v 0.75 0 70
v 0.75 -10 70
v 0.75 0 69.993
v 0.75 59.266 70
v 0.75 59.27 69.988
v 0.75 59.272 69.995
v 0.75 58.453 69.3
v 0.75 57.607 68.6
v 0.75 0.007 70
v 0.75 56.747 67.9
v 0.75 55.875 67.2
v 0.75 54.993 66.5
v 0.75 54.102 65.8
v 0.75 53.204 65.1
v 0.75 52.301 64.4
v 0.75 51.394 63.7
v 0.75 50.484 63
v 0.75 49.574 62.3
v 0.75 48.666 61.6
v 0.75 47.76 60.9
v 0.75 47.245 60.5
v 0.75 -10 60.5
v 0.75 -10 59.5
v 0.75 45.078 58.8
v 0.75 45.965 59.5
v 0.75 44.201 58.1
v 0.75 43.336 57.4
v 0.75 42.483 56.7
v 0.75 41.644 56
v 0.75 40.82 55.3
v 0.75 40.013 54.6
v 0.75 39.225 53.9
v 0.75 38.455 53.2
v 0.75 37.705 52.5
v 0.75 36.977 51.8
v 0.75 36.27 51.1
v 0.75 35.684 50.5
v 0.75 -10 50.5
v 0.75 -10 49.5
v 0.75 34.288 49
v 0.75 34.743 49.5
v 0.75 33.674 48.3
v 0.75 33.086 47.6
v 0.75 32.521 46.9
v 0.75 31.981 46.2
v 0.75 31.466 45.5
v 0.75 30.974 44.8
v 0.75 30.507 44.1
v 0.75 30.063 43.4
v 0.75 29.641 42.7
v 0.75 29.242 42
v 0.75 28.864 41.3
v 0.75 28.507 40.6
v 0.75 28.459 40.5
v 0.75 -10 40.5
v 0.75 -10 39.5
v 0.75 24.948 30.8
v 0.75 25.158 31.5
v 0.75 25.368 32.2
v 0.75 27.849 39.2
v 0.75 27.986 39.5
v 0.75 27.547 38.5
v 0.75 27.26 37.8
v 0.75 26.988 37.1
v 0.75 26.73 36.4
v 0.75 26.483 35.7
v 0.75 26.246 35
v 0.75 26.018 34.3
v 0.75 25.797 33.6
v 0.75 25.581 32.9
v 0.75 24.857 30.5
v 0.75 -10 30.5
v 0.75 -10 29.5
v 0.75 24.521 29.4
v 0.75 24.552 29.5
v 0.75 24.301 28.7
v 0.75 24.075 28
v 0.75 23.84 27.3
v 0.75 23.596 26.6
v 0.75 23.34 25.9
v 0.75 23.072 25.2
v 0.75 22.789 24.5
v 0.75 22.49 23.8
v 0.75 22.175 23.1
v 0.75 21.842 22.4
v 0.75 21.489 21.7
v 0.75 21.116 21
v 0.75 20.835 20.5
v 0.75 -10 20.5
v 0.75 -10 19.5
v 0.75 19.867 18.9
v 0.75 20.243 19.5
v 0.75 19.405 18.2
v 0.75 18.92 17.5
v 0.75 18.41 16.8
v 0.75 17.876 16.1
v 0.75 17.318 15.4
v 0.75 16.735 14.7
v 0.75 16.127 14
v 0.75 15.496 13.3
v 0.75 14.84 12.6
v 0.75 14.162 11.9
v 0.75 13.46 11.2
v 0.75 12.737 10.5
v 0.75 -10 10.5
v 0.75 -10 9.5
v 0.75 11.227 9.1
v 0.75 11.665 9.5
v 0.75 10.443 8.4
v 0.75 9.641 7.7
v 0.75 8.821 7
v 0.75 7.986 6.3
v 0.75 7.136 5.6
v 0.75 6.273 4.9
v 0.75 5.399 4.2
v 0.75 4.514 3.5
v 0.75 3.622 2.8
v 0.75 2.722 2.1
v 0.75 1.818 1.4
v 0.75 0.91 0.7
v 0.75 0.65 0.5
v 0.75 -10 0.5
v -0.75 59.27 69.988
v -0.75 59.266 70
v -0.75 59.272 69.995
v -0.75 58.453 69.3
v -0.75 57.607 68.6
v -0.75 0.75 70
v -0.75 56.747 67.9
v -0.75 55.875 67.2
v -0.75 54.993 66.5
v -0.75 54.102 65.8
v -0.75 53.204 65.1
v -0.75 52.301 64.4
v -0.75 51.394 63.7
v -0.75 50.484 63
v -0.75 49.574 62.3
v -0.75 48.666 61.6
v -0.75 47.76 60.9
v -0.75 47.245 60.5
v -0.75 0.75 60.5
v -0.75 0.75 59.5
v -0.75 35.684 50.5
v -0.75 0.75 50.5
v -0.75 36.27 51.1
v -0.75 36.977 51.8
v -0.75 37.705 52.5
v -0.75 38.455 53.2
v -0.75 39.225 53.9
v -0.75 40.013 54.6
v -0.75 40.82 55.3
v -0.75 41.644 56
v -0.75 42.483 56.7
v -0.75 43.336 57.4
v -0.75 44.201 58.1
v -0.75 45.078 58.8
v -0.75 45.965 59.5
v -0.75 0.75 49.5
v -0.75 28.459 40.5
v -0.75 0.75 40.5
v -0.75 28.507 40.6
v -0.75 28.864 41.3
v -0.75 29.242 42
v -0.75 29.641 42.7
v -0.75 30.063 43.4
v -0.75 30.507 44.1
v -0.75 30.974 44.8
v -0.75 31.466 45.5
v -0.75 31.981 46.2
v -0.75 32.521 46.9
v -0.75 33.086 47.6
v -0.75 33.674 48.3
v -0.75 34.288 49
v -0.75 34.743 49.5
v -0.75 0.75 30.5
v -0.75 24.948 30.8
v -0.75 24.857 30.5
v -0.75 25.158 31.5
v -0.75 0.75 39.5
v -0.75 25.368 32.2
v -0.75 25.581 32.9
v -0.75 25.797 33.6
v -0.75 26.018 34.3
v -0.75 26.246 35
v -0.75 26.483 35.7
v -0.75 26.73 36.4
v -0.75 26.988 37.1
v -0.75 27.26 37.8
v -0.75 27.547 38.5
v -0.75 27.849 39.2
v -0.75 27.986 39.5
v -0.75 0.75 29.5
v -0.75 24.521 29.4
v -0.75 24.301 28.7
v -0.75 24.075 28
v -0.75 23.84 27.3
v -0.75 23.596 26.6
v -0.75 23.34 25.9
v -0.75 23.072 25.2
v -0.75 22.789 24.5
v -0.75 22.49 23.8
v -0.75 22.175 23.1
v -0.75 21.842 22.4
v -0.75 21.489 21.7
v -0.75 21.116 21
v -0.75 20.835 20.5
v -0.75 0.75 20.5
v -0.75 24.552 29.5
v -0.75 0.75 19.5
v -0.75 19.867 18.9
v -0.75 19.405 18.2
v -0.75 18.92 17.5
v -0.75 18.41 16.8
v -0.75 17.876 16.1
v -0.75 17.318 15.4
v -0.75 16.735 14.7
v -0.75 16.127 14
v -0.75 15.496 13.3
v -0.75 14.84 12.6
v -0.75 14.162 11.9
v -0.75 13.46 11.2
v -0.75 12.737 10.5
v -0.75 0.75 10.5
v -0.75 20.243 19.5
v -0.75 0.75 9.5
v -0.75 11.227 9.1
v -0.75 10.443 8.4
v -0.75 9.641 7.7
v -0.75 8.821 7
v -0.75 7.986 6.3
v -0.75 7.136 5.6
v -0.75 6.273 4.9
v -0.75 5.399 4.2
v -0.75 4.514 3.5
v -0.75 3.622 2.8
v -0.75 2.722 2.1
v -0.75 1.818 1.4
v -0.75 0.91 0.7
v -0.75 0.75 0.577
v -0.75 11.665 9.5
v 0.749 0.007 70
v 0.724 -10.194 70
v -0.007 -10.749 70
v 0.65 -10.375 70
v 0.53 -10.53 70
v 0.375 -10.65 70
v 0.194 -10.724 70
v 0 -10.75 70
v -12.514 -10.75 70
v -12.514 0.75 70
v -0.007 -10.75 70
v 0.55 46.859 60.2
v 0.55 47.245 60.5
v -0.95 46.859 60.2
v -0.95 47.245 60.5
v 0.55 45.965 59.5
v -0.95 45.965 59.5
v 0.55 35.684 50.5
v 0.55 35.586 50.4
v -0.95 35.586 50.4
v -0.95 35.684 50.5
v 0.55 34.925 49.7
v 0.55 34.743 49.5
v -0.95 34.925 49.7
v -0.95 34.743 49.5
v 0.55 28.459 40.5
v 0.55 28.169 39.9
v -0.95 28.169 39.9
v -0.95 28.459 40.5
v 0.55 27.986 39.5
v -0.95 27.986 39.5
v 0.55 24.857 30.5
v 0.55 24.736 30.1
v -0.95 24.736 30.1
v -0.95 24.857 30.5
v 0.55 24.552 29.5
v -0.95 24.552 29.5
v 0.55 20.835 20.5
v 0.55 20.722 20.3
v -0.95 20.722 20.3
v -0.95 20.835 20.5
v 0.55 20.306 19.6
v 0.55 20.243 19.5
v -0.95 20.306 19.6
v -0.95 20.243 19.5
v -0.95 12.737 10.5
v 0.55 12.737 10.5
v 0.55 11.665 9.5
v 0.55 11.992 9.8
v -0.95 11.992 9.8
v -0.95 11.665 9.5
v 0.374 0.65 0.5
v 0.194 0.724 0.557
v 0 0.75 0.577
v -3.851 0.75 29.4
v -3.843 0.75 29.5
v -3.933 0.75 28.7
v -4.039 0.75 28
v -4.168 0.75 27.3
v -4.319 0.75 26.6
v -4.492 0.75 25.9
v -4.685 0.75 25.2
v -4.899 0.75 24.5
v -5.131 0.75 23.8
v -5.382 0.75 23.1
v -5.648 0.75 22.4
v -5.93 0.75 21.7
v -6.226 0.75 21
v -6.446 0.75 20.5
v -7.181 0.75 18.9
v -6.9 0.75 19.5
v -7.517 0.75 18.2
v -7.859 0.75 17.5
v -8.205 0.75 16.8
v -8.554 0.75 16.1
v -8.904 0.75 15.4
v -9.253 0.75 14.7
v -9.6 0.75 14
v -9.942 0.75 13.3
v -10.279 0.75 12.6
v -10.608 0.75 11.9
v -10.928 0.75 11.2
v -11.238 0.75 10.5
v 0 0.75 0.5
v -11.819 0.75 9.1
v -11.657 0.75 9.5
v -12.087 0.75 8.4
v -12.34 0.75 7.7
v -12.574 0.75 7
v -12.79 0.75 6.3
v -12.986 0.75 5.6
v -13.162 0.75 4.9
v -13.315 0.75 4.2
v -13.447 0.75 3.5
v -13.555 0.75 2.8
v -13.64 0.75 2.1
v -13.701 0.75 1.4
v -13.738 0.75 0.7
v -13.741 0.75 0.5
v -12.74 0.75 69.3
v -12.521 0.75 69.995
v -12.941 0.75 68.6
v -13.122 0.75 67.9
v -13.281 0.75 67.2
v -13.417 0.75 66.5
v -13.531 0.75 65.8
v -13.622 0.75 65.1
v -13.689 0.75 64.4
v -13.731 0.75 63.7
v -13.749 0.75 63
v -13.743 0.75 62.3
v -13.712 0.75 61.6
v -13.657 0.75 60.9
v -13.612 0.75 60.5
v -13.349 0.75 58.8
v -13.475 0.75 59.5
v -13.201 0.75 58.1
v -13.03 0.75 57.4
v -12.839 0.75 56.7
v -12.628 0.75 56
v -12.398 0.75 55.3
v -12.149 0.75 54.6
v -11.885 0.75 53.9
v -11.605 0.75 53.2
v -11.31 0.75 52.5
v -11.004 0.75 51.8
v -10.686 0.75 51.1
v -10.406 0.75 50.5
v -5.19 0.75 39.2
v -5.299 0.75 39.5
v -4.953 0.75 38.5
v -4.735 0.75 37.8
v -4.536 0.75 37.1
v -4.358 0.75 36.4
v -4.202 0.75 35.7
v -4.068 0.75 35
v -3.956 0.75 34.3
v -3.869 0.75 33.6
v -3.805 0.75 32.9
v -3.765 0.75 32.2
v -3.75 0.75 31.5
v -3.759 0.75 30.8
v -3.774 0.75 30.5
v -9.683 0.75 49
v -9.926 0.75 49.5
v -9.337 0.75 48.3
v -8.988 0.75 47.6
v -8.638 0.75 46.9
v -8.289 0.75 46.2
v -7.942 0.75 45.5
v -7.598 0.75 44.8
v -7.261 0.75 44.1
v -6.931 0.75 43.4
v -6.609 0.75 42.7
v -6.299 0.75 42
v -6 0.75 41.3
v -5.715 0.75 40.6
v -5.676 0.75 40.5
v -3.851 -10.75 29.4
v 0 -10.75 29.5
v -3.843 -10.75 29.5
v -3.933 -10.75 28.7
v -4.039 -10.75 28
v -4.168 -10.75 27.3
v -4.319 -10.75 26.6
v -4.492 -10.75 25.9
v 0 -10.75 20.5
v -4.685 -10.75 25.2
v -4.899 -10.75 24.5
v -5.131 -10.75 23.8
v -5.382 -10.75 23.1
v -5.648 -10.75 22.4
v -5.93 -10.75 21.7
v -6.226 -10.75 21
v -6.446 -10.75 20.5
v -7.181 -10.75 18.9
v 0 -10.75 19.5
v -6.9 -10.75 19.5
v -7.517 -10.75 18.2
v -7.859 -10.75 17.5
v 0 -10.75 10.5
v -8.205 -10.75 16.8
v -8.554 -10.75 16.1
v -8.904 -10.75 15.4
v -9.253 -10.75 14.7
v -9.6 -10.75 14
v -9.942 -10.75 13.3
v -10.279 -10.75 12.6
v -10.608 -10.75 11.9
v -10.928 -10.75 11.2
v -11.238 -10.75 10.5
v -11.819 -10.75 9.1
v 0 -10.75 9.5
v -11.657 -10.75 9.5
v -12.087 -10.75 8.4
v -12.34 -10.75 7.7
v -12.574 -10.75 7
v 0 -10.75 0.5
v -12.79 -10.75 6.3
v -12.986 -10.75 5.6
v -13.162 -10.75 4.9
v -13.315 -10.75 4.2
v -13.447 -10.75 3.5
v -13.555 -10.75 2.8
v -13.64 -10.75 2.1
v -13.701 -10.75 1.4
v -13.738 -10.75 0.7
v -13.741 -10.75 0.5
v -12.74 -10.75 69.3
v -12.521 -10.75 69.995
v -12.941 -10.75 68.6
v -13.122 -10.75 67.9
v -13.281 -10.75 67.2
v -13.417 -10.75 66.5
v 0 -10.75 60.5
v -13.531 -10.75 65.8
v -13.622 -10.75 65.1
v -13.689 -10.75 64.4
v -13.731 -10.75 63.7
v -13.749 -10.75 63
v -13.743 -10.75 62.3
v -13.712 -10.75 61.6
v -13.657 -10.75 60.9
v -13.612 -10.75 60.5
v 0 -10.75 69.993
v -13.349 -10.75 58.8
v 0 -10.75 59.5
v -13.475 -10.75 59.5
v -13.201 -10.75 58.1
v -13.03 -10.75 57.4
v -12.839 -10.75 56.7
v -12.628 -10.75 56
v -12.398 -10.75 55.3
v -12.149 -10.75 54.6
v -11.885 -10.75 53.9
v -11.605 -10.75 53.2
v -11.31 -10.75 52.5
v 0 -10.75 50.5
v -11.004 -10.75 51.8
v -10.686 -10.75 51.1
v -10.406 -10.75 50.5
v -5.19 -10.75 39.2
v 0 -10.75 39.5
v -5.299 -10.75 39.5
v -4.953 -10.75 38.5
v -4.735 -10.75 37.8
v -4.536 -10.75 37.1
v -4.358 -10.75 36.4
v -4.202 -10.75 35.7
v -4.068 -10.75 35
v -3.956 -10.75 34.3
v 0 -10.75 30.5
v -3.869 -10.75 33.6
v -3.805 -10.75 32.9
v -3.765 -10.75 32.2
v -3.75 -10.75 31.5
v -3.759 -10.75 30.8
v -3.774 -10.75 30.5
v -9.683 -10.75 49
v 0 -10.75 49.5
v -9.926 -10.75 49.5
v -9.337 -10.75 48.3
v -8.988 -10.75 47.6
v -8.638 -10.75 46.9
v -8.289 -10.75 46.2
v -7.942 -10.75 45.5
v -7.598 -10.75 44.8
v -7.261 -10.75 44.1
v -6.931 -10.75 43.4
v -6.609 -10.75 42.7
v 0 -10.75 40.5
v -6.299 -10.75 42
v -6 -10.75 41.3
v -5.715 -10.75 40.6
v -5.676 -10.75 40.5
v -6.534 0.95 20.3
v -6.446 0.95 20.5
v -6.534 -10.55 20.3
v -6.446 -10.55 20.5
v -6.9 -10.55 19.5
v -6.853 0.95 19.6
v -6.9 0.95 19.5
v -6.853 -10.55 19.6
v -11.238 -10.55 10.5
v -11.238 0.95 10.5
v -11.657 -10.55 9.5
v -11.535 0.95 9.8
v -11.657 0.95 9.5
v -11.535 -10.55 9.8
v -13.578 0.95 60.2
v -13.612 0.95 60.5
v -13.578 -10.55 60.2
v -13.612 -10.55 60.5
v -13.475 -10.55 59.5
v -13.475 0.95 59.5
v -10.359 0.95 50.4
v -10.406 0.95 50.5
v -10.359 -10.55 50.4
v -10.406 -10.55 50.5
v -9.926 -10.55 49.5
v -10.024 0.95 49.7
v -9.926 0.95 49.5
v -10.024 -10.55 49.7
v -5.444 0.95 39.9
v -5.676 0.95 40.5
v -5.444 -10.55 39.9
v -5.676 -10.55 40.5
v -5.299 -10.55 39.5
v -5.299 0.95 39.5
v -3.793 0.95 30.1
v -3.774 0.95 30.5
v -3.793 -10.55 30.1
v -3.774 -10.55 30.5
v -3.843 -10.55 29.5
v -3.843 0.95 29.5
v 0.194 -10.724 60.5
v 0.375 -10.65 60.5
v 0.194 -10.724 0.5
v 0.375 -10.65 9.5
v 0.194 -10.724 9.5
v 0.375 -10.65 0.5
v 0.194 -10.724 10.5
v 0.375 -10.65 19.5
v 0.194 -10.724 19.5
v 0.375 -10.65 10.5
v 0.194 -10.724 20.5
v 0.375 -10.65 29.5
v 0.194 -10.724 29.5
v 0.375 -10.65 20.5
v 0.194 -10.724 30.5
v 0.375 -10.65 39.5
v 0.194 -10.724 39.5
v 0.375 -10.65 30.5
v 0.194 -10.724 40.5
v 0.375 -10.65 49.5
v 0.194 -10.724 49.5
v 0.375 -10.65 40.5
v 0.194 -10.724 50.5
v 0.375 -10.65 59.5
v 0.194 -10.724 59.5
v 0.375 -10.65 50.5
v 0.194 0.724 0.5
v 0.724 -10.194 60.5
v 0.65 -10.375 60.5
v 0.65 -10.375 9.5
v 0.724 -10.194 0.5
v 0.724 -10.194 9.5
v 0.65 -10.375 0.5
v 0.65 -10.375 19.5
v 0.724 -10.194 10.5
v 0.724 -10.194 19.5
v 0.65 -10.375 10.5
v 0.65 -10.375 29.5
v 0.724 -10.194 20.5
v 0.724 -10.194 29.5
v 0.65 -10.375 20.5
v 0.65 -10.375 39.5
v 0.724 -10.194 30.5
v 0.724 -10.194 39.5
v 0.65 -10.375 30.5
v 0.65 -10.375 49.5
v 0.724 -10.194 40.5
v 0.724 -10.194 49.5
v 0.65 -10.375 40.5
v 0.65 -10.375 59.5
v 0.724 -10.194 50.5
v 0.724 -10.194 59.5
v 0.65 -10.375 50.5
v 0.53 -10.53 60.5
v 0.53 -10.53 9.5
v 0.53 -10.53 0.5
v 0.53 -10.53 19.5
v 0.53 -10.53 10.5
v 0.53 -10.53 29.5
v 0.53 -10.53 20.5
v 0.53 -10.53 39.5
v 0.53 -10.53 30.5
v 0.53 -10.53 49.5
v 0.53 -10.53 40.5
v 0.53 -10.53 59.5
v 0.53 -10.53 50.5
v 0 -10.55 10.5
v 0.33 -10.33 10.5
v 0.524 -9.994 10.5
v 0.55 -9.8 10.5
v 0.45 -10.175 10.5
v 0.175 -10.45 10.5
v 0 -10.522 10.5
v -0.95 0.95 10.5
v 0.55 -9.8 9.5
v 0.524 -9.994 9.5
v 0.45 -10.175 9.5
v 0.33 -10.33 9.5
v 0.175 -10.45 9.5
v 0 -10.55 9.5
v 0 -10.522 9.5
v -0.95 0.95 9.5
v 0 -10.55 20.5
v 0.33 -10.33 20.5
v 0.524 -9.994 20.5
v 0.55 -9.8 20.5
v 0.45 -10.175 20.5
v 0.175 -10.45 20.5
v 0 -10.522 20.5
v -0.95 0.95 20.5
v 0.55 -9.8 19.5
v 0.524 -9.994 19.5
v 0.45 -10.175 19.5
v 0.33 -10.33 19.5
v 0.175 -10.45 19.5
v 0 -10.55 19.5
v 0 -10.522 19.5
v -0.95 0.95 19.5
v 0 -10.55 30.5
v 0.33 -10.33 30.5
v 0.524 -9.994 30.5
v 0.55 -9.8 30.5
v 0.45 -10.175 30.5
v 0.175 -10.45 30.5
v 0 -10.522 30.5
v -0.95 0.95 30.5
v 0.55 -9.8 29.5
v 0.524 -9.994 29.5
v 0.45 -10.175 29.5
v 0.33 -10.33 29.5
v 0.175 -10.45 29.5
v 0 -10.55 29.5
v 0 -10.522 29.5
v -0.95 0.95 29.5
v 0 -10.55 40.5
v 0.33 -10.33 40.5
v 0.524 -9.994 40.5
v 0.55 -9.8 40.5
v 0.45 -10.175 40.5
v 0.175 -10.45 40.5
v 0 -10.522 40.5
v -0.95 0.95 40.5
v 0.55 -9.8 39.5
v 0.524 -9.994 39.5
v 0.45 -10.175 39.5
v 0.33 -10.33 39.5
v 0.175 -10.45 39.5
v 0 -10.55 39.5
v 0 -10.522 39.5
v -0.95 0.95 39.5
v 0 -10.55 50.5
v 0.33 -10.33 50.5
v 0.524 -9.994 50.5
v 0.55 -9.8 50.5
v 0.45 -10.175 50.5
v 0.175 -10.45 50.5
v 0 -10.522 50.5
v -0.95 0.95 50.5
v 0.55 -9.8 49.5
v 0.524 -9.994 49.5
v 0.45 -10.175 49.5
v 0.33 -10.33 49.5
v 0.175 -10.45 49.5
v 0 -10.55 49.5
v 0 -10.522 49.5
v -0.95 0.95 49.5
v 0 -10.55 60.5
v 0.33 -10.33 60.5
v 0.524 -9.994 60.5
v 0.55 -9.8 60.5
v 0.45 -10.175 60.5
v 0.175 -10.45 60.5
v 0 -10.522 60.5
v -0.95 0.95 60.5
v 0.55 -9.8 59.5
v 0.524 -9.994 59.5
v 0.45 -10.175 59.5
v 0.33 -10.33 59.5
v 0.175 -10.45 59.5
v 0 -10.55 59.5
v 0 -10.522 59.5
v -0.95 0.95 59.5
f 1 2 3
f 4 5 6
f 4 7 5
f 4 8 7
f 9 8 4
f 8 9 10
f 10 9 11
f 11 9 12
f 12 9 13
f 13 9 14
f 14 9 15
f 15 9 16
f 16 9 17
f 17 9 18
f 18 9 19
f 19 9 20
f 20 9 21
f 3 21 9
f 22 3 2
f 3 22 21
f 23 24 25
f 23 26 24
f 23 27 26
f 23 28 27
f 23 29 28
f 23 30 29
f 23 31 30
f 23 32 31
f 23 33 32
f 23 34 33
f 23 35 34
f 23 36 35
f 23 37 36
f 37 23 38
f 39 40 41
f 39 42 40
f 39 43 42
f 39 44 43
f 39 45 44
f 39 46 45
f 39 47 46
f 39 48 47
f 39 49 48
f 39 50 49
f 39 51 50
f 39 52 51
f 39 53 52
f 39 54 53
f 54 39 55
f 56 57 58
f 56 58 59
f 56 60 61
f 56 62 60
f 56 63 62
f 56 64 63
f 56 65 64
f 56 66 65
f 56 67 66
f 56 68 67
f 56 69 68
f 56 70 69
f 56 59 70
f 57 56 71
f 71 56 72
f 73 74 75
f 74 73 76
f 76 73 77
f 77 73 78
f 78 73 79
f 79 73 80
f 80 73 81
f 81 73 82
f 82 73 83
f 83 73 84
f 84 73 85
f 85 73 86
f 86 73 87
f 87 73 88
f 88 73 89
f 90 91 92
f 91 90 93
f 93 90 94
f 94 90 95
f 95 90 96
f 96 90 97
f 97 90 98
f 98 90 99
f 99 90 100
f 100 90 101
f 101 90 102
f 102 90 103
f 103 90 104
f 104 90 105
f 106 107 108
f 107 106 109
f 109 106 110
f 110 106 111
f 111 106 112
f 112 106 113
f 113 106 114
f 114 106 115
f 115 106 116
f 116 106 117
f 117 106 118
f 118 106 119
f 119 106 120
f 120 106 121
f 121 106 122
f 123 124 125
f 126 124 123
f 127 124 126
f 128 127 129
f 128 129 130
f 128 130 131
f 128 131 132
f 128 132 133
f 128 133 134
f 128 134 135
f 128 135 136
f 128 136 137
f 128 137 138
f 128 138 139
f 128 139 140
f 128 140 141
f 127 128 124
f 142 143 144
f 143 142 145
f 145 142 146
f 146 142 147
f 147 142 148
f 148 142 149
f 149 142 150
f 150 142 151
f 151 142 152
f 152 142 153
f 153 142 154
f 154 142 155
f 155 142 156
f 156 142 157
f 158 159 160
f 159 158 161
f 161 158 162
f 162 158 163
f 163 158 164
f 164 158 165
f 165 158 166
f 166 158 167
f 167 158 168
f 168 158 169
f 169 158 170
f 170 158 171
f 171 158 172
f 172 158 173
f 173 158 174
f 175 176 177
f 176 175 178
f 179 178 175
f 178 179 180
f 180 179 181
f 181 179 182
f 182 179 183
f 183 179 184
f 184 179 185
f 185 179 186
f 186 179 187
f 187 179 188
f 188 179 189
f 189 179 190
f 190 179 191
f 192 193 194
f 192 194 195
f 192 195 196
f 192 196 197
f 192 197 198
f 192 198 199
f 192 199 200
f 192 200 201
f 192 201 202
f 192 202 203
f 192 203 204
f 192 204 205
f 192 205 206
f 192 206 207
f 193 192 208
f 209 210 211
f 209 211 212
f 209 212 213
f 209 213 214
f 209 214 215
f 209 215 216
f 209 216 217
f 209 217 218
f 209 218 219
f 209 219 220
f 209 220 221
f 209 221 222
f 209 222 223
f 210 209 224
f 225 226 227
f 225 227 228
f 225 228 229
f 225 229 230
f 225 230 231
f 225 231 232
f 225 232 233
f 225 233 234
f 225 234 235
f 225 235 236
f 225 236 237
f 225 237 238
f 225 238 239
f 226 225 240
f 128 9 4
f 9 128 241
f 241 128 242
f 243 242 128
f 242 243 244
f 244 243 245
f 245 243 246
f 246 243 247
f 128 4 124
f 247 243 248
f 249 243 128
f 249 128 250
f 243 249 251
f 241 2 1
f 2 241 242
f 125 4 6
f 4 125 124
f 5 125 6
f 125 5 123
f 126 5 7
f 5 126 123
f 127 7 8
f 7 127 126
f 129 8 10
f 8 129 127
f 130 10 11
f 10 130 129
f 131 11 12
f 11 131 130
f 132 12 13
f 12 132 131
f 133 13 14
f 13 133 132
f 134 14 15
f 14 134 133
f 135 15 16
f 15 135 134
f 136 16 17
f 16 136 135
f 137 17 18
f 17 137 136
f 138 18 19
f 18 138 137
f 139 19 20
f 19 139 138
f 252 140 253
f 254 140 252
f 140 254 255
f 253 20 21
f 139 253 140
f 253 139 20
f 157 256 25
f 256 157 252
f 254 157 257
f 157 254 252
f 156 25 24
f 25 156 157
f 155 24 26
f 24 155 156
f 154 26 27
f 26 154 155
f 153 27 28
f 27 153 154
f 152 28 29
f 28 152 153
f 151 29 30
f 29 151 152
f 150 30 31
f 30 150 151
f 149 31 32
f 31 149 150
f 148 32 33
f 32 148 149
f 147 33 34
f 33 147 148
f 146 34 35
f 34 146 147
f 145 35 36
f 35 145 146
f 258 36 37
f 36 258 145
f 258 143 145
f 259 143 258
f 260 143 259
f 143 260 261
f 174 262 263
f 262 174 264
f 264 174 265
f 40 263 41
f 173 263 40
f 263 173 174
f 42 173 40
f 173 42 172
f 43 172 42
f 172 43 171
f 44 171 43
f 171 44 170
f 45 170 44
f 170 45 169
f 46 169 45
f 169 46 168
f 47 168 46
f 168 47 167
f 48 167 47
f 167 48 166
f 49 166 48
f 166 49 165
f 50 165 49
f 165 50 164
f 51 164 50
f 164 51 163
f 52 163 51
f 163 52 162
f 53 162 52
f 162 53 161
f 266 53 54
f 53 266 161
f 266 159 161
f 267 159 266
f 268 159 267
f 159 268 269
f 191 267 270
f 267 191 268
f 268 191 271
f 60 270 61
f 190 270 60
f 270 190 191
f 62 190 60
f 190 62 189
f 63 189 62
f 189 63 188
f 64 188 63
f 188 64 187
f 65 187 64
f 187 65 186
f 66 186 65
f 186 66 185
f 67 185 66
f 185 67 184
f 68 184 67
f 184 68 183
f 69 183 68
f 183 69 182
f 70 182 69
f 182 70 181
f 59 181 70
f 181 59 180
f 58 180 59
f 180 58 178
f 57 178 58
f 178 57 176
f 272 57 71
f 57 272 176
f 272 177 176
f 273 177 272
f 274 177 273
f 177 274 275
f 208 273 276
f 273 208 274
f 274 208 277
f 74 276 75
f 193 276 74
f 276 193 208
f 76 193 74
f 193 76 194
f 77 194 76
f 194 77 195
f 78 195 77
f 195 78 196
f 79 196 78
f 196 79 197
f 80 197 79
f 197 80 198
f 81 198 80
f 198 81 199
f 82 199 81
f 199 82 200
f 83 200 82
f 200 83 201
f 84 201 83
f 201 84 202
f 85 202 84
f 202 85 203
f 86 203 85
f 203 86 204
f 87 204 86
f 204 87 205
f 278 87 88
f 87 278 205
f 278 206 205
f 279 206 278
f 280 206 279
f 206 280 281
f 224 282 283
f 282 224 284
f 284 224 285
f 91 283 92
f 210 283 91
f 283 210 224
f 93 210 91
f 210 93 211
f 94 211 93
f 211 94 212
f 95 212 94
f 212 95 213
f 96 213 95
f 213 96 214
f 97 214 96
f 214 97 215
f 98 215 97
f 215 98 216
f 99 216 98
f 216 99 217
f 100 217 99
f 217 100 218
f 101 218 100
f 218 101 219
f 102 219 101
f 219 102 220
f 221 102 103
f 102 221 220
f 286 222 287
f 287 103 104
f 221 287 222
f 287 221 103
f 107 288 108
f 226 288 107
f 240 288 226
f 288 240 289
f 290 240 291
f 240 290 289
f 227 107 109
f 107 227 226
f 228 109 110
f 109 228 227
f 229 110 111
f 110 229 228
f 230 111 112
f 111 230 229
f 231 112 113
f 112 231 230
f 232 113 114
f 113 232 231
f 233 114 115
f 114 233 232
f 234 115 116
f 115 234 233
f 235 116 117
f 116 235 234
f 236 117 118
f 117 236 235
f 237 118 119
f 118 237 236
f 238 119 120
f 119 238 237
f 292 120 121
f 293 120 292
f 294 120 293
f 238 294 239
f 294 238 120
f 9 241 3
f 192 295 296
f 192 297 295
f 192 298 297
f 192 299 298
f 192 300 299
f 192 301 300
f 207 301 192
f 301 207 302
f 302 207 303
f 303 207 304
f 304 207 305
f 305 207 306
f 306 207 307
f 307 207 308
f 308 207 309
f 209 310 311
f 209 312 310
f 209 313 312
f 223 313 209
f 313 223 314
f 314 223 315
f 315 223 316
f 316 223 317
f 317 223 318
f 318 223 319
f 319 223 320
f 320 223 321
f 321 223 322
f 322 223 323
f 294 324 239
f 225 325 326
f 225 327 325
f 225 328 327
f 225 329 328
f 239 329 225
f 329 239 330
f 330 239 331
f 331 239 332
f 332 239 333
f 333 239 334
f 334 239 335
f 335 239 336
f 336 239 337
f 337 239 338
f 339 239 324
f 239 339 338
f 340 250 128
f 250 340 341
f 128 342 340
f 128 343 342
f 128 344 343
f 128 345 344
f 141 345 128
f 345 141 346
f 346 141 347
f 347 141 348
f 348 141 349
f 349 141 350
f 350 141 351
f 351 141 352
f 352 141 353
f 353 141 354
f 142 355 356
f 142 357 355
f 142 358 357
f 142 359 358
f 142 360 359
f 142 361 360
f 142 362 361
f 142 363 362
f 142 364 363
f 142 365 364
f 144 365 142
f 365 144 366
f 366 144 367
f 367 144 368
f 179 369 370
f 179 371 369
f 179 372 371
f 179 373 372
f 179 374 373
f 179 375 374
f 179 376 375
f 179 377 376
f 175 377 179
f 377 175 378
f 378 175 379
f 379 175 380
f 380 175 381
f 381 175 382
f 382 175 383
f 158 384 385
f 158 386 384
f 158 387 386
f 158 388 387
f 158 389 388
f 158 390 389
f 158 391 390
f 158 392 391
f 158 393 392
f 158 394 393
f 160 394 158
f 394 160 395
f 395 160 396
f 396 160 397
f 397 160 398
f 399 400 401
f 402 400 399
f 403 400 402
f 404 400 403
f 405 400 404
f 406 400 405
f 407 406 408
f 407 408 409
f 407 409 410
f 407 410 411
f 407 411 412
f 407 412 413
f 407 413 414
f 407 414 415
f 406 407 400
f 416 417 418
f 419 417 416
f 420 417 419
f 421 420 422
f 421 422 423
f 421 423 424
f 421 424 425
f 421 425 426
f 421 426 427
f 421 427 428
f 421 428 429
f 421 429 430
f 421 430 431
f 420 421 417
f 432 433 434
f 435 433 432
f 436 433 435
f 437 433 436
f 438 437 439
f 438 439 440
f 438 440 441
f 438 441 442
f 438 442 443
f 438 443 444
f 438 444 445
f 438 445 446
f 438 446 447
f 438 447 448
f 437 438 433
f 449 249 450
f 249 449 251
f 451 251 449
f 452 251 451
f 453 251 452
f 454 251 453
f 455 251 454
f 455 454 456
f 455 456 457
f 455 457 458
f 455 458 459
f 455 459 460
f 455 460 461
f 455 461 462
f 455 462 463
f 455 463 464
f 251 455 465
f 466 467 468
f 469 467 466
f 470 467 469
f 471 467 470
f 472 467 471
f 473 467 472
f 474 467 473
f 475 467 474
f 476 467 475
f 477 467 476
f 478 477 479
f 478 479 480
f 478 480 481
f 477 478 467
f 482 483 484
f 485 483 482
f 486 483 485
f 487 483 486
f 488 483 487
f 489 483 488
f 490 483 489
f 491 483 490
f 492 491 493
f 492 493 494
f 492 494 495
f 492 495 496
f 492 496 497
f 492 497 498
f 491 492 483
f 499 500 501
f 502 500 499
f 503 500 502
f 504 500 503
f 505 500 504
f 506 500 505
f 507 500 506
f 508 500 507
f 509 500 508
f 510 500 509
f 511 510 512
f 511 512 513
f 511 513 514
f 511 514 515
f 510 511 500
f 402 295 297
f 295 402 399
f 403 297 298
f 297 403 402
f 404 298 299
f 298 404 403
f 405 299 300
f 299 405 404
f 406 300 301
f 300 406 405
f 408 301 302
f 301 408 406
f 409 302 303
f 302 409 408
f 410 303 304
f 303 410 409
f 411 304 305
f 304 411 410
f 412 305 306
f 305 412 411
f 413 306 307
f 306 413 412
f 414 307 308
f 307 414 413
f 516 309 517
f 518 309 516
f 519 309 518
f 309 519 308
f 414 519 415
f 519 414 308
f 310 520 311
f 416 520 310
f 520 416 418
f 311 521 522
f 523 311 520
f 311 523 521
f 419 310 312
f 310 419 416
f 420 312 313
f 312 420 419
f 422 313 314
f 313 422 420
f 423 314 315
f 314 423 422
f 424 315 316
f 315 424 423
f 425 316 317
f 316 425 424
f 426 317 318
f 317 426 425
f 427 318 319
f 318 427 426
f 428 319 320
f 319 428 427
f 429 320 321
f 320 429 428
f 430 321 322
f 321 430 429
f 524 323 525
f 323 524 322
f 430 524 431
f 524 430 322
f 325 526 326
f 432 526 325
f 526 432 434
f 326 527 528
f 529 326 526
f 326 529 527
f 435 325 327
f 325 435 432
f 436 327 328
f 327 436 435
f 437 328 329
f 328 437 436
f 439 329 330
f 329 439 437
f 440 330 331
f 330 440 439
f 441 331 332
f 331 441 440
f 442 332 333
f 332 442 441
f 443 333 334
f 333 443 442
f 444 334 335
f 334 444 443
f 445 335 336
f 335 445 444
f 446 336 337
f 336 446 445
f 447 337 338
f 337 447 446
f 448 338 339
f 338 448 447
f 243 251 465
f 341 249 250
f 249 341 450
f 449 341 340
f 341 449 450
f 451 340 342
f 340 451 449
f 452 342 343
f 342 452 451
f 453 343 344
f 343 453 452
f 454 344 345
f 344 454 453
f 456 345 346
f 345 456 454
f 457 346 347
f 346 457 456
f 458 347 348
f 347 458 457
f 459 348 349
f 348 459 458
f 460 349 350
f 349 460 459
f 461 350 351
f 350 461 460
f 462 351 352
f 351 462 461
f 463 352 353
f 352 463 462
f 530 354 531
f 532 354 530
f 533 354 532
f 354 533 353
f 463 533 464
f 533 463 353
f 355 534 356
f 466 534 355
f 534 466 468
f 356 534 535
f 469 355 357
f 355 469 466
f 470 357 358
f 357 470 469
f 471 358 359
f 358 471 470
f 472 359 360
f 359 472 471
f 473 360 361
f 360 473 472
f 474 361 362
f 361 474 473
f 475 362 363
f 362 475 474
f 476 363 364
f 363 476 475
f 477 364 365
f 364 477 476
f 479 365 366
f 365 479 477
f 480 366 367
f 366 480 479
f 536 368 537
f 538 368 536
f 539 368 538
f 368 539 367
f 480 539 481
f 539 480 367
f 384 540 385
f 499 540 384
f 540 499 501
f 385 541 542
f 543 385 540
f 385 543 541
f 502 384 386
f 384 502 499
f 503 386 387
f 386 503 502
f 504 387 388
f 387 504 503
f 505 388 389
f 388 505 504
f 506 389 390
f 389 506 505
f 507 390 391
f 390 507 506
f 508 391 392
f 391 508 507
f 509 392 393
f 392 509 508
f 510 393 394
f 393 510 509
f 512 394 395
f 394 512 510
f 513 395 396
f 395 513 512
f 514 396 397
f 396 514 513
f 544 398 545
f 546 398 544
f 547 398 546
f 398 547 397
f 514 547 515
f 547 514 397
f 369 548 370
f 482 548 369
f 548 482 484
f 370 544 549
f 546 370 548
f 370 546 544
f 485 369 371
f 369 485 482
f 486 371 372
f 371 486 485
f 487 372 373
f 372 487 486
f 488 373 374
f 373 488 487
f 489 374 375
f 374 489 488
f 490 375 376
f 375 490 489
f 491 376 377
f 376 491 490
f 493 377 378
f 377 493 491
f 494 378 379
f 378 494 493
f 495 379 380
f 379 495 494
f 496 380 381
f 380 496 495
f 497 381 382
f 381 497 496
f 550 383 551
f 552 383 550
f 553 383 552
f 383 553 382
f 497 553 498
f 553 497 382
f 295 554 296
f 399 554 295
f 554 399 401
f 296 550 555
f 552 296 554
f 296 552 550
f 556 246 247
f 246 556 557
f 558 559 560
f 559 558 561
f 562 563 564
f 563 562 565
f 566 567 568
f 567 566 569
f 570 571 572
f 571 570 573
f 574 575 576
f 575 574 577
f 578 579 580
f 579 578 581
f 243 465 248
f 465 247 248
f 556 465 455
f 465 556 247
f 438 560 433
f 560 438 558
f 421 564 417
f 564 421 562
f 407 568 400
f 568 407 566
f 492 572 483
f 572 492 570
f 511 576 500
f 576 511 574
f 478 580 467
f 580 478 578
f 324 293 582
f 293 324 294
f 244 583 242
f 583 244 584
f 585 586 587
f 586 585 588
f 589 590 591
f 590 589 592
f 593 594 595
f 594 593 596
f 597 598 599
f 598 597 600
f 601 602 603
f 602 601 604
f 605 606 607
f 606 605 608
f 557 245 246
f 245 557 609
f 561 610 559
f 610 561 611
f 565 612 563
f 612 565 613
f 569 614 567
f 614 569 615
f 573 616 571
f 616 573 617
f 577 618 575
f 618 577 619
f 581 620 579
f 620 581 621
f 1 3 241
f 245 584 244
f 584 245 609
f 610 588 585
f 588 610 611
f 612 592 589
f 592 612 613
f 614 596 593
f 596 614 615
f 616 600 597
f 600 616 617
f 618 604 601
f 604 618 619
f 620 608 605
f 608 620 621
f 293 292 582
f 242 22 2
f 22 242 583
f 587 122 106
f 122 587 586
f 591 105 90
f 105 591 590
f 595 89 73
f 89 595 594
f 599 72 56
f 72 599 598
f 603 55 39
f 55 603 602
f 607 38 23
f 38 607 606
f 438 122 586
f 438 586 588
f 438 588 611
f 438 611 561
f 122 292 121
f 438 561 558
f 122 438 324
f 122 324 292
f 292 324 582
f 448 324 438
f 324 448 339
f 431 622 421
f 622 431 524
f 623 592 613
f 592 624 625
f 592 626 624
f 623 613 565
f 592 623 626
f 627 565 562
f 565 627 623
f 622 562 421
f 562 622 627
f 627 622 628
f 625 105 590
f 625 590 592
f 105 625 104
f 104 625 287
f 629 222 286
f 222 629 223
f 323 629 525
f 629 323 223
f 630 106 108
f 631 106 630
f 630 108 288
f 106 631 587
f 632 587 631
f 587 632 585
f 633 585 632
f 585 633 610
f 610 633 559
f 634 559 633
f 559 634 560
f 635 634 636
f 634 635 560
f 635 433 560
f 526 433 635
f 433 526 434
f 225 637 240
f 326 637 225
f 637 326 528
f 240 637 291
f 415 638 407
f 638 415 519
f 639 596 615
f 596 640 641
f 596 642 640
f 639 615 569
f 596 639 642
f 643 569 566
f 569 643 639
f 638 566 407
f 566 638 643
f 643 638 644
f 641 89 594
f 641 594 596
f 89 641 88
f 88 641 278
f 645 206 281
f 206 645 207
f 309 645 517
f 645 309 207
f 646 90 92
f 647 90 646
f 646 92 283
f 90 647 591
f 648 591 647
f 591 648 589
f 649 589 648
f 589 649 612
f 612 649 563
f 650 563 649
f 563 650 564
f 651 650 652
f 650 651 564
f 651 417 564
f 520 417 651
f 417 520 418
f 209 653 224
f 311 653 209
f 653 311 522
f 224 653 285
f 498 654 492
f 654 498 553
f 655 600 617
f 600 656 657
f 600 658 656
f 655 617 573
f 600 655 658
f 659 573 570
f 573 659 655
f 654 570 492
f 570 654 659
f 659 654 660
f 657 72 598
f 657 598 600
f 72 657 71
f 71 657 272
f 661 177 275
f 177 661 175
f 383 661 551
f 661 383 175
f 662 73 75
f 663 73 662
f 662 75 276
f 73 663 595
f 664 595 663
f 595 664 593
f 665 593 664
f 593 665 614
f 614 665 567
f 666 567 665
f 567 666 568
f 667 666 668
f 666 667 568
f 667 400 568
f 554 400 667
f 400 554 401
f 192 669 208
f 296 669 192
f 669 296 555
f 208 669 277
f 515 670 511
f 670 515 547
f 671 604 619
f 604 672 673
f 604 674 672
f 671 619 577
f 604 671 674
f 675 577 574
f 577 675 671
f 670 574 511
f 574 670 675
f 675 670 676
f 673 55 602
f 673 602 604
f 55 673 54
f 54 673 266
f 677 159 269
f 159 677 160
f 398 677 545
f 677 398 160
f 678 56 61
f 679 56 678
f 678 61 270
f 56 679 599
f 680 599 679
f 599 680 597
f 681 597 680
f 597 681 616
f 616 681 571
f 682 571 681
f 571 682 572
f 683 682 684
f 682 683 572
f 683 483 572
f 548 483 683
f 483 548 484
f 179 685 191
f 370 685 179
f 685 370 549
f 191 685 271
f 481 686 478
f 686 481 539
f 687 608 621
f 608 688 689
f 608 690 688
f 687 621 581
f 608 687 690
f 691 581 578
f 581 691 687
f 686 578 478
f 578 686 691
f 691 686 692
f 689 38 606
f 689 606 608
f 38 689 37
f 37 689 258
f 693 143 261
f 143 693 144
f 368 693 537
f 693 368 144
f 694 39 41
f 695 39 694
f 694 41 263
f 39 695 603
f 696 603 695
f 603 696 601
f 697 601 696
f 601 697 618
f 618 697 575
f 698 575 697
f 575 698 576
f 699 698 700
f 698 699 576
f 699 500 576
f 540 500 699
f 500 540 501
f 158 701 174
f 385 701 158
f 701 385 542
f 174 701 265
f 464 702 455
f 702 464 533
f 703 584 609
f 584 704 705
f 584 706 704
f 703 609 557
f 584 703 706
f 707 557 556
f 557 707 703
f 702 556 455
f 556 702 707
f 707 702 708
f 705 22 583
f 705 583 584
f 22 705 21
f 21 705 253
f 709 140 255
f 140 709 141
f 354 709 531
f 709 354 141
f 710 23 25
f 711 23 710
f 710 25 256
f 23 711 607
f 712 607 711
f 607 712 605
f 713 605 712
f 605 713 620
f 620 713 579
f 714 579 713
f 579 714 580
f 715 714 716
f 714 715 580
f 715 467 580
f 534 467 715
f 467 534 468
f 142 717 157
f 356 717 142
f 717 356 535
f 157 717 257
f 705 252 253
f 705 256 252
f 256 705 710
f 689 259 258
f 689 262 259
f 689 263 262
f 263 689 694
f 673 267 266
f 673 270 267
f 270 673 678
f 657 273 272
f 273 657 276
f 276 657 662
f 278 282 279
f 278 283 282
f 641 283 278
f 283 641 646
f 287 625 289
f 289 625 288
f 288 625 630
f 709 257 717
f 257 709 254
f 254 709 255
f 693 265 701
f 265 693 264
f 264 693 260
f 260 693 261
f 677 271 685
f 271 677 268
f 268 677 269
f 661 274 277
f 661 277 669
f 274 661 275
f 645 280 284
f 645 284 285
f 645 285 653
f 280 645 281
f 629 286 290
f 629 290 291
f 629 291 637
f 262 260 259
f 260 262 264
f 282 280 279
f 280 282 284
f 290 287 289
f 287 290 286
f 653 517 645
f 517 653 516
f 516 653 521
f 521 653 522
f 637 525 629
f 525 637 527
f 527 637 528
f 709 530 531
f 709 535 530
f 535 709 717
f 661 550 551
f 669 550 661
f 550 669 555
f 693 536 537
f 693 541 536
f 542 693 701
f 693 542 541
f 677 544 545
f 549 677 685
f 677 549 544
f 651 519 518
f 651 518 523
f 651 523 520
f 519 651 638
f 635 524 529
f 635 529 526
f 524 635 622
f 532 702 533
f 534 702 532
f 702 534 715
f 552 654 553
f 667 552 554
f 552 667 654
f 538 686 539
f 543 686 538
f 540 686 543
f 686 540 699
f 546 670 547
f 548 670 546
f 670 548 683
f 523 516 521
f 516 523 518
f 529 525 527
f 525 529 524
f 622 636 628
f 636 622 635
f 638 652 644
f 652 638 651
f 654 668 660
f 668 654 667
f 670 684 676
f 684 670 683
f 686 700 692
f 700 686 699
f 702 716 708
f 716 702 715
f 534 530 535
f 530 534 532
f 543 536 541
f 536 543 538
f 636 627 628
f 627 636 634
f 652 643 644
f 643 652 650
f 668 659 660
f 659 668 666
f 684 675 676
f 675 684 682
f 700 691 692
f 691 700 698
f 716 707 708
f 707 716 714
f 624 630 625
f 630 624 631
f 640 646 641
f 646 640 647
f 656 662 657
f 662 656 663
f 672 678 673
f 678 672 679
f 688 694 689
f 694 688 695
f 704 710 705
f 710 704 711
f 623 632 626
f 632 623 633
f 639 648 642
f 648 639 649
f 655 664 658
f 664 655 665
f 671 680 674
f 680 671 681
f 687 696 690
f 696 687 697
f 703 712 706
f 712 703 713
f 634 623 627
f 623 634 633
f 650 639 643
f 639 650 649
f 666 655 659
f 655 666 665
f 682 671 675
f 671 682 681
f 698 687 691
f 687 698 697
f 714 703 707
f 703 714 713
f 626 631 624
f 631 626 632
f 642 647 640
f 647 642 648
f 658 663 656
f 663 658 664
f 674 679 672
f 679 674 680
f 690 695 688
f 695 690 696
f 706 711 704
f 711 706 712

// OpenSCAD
xmin = 0;
xmax = 7;
step = (xmax - xmin) / 100;

c = 0;
c = f(xmin);

xunit = 10;
thick = 1.5;

openwidth = 10;

xmark = .2;


function f(x) = sin(x * 180 / PI) * 5 + x * 8;
function d(x) = cos(x * 180 / PI) * 5 + 8;


x = [for(x = [xmin:step:xmax + step / 2]) x];
integral = integrate([for(x = x) d(x) * step], c);
	
$fs = .2;
$fa = 2;

translate([0, 0, 0 * xunit * xmax]) rotate([0, -90, 0]) {
	difference() {
		union() {
			linear_extrude(thick, center = true, convexity = 10) offset(xmax / 1000) offset(-xmax / 1000) polygon(concat([for(x = x) [x * xunit, f(x)]], [[xmax * xunit, 0], [xmin * xunit, 0]]));
			rotate([90, 0, 0]) translate([0, 0, openwidth / 2]) linear_extrude(thick + openwidth, center = true, convexity = 10) offset(xmax / 1000) offset(-xmax / 1000) polygon(concat([for(x = x) [x * xunit, d(x) + thick/2]], [[xmax * xunit, 0], [xmin * xunit, 0]]));
		rotate([0, 90, 0]) hull() for(i = [0, 1]) translate([0, i * -openwidth, xmin * xunit]) cylinder(r = thick / 2, h = (xmax - xmin) * xunit);
		}
		if(ceil(xmin + step) < (xmax - step)) for(x = [ceil(xmin):xmax - step]) translate([x * xunit, 0, 0]) cube([1, 1000, 1000], center = true);
	}
		
	#%translate([0, 0, xmark / 2]) linear_extrude(thick, center = true) offset(xmax / 1000) offset(-xmax / 1000) polygon(concat([for(i = [0:len(x) - 1]) [x[i] * xunit, integral[i]]], [[xmax * xunit, 0], [xmin * xunit, 0]]));
	#%rotate([90, 0, 0]) translate([0, 0, -xmark / 2]) linear_extrude(thick, center = true) offset(xmax / 1000) offset(-xmax / 1000) polygon(concat([for(x = x) [x * xunit, ((f(x) - f(x - step)) + (f(x + step) - f(x))) / 2 / step]], [[xmax * xunit, 0], [xmin * xunit, 0]]));
		
	if(ceil(xmin + step) < (xmax - step)) 
		intersection() {
		union() {
			translate([0, 0, xmark]) linear_extrude(thick, center = true, convexity = 10) offset(xmax / 1000) offset(-xmax / 1000) polygon(concat([for(x = x) [x * xunit, f(x)]], [[max(x) * xunit, 0], [min(x) * xunit, 0]]));
			rotate([90, 0, 0]) translate([0, 0, -xmark + openwidth / 2]) linear_extrude(thick + openwidth, center = true, convexity = 10) offset(xmax / 1000) offset(-xmax / 1000) polygon(concat([for(x = x) [x * xunit, d(x) + thick / 2]], [[max(x) * xunit, 0], [min(x) * xunit, 0]]));
			rotate([0, 90, 0]) hull() for(i = [0, 1]) translate([-xmark, xmark + i * -openwidth, xmin * xunit]) cylinder(r = thick / 2, h = (xmax - xmin) * xunit);
		}
		for(x = [ceil(xmin + step):xmax - step]) translate([x * xunit, 0, 0]) cube([1, 1000, 1000], center = true);
	}
}

function integrate(v, c = 0, sum = []) = (len(v) == len(sum)) ? sum : integrate(v, c, concat(sum, [len(sum) ? sum[len(sum) - 1] + v[len(sum)] : v[0] + c]));
